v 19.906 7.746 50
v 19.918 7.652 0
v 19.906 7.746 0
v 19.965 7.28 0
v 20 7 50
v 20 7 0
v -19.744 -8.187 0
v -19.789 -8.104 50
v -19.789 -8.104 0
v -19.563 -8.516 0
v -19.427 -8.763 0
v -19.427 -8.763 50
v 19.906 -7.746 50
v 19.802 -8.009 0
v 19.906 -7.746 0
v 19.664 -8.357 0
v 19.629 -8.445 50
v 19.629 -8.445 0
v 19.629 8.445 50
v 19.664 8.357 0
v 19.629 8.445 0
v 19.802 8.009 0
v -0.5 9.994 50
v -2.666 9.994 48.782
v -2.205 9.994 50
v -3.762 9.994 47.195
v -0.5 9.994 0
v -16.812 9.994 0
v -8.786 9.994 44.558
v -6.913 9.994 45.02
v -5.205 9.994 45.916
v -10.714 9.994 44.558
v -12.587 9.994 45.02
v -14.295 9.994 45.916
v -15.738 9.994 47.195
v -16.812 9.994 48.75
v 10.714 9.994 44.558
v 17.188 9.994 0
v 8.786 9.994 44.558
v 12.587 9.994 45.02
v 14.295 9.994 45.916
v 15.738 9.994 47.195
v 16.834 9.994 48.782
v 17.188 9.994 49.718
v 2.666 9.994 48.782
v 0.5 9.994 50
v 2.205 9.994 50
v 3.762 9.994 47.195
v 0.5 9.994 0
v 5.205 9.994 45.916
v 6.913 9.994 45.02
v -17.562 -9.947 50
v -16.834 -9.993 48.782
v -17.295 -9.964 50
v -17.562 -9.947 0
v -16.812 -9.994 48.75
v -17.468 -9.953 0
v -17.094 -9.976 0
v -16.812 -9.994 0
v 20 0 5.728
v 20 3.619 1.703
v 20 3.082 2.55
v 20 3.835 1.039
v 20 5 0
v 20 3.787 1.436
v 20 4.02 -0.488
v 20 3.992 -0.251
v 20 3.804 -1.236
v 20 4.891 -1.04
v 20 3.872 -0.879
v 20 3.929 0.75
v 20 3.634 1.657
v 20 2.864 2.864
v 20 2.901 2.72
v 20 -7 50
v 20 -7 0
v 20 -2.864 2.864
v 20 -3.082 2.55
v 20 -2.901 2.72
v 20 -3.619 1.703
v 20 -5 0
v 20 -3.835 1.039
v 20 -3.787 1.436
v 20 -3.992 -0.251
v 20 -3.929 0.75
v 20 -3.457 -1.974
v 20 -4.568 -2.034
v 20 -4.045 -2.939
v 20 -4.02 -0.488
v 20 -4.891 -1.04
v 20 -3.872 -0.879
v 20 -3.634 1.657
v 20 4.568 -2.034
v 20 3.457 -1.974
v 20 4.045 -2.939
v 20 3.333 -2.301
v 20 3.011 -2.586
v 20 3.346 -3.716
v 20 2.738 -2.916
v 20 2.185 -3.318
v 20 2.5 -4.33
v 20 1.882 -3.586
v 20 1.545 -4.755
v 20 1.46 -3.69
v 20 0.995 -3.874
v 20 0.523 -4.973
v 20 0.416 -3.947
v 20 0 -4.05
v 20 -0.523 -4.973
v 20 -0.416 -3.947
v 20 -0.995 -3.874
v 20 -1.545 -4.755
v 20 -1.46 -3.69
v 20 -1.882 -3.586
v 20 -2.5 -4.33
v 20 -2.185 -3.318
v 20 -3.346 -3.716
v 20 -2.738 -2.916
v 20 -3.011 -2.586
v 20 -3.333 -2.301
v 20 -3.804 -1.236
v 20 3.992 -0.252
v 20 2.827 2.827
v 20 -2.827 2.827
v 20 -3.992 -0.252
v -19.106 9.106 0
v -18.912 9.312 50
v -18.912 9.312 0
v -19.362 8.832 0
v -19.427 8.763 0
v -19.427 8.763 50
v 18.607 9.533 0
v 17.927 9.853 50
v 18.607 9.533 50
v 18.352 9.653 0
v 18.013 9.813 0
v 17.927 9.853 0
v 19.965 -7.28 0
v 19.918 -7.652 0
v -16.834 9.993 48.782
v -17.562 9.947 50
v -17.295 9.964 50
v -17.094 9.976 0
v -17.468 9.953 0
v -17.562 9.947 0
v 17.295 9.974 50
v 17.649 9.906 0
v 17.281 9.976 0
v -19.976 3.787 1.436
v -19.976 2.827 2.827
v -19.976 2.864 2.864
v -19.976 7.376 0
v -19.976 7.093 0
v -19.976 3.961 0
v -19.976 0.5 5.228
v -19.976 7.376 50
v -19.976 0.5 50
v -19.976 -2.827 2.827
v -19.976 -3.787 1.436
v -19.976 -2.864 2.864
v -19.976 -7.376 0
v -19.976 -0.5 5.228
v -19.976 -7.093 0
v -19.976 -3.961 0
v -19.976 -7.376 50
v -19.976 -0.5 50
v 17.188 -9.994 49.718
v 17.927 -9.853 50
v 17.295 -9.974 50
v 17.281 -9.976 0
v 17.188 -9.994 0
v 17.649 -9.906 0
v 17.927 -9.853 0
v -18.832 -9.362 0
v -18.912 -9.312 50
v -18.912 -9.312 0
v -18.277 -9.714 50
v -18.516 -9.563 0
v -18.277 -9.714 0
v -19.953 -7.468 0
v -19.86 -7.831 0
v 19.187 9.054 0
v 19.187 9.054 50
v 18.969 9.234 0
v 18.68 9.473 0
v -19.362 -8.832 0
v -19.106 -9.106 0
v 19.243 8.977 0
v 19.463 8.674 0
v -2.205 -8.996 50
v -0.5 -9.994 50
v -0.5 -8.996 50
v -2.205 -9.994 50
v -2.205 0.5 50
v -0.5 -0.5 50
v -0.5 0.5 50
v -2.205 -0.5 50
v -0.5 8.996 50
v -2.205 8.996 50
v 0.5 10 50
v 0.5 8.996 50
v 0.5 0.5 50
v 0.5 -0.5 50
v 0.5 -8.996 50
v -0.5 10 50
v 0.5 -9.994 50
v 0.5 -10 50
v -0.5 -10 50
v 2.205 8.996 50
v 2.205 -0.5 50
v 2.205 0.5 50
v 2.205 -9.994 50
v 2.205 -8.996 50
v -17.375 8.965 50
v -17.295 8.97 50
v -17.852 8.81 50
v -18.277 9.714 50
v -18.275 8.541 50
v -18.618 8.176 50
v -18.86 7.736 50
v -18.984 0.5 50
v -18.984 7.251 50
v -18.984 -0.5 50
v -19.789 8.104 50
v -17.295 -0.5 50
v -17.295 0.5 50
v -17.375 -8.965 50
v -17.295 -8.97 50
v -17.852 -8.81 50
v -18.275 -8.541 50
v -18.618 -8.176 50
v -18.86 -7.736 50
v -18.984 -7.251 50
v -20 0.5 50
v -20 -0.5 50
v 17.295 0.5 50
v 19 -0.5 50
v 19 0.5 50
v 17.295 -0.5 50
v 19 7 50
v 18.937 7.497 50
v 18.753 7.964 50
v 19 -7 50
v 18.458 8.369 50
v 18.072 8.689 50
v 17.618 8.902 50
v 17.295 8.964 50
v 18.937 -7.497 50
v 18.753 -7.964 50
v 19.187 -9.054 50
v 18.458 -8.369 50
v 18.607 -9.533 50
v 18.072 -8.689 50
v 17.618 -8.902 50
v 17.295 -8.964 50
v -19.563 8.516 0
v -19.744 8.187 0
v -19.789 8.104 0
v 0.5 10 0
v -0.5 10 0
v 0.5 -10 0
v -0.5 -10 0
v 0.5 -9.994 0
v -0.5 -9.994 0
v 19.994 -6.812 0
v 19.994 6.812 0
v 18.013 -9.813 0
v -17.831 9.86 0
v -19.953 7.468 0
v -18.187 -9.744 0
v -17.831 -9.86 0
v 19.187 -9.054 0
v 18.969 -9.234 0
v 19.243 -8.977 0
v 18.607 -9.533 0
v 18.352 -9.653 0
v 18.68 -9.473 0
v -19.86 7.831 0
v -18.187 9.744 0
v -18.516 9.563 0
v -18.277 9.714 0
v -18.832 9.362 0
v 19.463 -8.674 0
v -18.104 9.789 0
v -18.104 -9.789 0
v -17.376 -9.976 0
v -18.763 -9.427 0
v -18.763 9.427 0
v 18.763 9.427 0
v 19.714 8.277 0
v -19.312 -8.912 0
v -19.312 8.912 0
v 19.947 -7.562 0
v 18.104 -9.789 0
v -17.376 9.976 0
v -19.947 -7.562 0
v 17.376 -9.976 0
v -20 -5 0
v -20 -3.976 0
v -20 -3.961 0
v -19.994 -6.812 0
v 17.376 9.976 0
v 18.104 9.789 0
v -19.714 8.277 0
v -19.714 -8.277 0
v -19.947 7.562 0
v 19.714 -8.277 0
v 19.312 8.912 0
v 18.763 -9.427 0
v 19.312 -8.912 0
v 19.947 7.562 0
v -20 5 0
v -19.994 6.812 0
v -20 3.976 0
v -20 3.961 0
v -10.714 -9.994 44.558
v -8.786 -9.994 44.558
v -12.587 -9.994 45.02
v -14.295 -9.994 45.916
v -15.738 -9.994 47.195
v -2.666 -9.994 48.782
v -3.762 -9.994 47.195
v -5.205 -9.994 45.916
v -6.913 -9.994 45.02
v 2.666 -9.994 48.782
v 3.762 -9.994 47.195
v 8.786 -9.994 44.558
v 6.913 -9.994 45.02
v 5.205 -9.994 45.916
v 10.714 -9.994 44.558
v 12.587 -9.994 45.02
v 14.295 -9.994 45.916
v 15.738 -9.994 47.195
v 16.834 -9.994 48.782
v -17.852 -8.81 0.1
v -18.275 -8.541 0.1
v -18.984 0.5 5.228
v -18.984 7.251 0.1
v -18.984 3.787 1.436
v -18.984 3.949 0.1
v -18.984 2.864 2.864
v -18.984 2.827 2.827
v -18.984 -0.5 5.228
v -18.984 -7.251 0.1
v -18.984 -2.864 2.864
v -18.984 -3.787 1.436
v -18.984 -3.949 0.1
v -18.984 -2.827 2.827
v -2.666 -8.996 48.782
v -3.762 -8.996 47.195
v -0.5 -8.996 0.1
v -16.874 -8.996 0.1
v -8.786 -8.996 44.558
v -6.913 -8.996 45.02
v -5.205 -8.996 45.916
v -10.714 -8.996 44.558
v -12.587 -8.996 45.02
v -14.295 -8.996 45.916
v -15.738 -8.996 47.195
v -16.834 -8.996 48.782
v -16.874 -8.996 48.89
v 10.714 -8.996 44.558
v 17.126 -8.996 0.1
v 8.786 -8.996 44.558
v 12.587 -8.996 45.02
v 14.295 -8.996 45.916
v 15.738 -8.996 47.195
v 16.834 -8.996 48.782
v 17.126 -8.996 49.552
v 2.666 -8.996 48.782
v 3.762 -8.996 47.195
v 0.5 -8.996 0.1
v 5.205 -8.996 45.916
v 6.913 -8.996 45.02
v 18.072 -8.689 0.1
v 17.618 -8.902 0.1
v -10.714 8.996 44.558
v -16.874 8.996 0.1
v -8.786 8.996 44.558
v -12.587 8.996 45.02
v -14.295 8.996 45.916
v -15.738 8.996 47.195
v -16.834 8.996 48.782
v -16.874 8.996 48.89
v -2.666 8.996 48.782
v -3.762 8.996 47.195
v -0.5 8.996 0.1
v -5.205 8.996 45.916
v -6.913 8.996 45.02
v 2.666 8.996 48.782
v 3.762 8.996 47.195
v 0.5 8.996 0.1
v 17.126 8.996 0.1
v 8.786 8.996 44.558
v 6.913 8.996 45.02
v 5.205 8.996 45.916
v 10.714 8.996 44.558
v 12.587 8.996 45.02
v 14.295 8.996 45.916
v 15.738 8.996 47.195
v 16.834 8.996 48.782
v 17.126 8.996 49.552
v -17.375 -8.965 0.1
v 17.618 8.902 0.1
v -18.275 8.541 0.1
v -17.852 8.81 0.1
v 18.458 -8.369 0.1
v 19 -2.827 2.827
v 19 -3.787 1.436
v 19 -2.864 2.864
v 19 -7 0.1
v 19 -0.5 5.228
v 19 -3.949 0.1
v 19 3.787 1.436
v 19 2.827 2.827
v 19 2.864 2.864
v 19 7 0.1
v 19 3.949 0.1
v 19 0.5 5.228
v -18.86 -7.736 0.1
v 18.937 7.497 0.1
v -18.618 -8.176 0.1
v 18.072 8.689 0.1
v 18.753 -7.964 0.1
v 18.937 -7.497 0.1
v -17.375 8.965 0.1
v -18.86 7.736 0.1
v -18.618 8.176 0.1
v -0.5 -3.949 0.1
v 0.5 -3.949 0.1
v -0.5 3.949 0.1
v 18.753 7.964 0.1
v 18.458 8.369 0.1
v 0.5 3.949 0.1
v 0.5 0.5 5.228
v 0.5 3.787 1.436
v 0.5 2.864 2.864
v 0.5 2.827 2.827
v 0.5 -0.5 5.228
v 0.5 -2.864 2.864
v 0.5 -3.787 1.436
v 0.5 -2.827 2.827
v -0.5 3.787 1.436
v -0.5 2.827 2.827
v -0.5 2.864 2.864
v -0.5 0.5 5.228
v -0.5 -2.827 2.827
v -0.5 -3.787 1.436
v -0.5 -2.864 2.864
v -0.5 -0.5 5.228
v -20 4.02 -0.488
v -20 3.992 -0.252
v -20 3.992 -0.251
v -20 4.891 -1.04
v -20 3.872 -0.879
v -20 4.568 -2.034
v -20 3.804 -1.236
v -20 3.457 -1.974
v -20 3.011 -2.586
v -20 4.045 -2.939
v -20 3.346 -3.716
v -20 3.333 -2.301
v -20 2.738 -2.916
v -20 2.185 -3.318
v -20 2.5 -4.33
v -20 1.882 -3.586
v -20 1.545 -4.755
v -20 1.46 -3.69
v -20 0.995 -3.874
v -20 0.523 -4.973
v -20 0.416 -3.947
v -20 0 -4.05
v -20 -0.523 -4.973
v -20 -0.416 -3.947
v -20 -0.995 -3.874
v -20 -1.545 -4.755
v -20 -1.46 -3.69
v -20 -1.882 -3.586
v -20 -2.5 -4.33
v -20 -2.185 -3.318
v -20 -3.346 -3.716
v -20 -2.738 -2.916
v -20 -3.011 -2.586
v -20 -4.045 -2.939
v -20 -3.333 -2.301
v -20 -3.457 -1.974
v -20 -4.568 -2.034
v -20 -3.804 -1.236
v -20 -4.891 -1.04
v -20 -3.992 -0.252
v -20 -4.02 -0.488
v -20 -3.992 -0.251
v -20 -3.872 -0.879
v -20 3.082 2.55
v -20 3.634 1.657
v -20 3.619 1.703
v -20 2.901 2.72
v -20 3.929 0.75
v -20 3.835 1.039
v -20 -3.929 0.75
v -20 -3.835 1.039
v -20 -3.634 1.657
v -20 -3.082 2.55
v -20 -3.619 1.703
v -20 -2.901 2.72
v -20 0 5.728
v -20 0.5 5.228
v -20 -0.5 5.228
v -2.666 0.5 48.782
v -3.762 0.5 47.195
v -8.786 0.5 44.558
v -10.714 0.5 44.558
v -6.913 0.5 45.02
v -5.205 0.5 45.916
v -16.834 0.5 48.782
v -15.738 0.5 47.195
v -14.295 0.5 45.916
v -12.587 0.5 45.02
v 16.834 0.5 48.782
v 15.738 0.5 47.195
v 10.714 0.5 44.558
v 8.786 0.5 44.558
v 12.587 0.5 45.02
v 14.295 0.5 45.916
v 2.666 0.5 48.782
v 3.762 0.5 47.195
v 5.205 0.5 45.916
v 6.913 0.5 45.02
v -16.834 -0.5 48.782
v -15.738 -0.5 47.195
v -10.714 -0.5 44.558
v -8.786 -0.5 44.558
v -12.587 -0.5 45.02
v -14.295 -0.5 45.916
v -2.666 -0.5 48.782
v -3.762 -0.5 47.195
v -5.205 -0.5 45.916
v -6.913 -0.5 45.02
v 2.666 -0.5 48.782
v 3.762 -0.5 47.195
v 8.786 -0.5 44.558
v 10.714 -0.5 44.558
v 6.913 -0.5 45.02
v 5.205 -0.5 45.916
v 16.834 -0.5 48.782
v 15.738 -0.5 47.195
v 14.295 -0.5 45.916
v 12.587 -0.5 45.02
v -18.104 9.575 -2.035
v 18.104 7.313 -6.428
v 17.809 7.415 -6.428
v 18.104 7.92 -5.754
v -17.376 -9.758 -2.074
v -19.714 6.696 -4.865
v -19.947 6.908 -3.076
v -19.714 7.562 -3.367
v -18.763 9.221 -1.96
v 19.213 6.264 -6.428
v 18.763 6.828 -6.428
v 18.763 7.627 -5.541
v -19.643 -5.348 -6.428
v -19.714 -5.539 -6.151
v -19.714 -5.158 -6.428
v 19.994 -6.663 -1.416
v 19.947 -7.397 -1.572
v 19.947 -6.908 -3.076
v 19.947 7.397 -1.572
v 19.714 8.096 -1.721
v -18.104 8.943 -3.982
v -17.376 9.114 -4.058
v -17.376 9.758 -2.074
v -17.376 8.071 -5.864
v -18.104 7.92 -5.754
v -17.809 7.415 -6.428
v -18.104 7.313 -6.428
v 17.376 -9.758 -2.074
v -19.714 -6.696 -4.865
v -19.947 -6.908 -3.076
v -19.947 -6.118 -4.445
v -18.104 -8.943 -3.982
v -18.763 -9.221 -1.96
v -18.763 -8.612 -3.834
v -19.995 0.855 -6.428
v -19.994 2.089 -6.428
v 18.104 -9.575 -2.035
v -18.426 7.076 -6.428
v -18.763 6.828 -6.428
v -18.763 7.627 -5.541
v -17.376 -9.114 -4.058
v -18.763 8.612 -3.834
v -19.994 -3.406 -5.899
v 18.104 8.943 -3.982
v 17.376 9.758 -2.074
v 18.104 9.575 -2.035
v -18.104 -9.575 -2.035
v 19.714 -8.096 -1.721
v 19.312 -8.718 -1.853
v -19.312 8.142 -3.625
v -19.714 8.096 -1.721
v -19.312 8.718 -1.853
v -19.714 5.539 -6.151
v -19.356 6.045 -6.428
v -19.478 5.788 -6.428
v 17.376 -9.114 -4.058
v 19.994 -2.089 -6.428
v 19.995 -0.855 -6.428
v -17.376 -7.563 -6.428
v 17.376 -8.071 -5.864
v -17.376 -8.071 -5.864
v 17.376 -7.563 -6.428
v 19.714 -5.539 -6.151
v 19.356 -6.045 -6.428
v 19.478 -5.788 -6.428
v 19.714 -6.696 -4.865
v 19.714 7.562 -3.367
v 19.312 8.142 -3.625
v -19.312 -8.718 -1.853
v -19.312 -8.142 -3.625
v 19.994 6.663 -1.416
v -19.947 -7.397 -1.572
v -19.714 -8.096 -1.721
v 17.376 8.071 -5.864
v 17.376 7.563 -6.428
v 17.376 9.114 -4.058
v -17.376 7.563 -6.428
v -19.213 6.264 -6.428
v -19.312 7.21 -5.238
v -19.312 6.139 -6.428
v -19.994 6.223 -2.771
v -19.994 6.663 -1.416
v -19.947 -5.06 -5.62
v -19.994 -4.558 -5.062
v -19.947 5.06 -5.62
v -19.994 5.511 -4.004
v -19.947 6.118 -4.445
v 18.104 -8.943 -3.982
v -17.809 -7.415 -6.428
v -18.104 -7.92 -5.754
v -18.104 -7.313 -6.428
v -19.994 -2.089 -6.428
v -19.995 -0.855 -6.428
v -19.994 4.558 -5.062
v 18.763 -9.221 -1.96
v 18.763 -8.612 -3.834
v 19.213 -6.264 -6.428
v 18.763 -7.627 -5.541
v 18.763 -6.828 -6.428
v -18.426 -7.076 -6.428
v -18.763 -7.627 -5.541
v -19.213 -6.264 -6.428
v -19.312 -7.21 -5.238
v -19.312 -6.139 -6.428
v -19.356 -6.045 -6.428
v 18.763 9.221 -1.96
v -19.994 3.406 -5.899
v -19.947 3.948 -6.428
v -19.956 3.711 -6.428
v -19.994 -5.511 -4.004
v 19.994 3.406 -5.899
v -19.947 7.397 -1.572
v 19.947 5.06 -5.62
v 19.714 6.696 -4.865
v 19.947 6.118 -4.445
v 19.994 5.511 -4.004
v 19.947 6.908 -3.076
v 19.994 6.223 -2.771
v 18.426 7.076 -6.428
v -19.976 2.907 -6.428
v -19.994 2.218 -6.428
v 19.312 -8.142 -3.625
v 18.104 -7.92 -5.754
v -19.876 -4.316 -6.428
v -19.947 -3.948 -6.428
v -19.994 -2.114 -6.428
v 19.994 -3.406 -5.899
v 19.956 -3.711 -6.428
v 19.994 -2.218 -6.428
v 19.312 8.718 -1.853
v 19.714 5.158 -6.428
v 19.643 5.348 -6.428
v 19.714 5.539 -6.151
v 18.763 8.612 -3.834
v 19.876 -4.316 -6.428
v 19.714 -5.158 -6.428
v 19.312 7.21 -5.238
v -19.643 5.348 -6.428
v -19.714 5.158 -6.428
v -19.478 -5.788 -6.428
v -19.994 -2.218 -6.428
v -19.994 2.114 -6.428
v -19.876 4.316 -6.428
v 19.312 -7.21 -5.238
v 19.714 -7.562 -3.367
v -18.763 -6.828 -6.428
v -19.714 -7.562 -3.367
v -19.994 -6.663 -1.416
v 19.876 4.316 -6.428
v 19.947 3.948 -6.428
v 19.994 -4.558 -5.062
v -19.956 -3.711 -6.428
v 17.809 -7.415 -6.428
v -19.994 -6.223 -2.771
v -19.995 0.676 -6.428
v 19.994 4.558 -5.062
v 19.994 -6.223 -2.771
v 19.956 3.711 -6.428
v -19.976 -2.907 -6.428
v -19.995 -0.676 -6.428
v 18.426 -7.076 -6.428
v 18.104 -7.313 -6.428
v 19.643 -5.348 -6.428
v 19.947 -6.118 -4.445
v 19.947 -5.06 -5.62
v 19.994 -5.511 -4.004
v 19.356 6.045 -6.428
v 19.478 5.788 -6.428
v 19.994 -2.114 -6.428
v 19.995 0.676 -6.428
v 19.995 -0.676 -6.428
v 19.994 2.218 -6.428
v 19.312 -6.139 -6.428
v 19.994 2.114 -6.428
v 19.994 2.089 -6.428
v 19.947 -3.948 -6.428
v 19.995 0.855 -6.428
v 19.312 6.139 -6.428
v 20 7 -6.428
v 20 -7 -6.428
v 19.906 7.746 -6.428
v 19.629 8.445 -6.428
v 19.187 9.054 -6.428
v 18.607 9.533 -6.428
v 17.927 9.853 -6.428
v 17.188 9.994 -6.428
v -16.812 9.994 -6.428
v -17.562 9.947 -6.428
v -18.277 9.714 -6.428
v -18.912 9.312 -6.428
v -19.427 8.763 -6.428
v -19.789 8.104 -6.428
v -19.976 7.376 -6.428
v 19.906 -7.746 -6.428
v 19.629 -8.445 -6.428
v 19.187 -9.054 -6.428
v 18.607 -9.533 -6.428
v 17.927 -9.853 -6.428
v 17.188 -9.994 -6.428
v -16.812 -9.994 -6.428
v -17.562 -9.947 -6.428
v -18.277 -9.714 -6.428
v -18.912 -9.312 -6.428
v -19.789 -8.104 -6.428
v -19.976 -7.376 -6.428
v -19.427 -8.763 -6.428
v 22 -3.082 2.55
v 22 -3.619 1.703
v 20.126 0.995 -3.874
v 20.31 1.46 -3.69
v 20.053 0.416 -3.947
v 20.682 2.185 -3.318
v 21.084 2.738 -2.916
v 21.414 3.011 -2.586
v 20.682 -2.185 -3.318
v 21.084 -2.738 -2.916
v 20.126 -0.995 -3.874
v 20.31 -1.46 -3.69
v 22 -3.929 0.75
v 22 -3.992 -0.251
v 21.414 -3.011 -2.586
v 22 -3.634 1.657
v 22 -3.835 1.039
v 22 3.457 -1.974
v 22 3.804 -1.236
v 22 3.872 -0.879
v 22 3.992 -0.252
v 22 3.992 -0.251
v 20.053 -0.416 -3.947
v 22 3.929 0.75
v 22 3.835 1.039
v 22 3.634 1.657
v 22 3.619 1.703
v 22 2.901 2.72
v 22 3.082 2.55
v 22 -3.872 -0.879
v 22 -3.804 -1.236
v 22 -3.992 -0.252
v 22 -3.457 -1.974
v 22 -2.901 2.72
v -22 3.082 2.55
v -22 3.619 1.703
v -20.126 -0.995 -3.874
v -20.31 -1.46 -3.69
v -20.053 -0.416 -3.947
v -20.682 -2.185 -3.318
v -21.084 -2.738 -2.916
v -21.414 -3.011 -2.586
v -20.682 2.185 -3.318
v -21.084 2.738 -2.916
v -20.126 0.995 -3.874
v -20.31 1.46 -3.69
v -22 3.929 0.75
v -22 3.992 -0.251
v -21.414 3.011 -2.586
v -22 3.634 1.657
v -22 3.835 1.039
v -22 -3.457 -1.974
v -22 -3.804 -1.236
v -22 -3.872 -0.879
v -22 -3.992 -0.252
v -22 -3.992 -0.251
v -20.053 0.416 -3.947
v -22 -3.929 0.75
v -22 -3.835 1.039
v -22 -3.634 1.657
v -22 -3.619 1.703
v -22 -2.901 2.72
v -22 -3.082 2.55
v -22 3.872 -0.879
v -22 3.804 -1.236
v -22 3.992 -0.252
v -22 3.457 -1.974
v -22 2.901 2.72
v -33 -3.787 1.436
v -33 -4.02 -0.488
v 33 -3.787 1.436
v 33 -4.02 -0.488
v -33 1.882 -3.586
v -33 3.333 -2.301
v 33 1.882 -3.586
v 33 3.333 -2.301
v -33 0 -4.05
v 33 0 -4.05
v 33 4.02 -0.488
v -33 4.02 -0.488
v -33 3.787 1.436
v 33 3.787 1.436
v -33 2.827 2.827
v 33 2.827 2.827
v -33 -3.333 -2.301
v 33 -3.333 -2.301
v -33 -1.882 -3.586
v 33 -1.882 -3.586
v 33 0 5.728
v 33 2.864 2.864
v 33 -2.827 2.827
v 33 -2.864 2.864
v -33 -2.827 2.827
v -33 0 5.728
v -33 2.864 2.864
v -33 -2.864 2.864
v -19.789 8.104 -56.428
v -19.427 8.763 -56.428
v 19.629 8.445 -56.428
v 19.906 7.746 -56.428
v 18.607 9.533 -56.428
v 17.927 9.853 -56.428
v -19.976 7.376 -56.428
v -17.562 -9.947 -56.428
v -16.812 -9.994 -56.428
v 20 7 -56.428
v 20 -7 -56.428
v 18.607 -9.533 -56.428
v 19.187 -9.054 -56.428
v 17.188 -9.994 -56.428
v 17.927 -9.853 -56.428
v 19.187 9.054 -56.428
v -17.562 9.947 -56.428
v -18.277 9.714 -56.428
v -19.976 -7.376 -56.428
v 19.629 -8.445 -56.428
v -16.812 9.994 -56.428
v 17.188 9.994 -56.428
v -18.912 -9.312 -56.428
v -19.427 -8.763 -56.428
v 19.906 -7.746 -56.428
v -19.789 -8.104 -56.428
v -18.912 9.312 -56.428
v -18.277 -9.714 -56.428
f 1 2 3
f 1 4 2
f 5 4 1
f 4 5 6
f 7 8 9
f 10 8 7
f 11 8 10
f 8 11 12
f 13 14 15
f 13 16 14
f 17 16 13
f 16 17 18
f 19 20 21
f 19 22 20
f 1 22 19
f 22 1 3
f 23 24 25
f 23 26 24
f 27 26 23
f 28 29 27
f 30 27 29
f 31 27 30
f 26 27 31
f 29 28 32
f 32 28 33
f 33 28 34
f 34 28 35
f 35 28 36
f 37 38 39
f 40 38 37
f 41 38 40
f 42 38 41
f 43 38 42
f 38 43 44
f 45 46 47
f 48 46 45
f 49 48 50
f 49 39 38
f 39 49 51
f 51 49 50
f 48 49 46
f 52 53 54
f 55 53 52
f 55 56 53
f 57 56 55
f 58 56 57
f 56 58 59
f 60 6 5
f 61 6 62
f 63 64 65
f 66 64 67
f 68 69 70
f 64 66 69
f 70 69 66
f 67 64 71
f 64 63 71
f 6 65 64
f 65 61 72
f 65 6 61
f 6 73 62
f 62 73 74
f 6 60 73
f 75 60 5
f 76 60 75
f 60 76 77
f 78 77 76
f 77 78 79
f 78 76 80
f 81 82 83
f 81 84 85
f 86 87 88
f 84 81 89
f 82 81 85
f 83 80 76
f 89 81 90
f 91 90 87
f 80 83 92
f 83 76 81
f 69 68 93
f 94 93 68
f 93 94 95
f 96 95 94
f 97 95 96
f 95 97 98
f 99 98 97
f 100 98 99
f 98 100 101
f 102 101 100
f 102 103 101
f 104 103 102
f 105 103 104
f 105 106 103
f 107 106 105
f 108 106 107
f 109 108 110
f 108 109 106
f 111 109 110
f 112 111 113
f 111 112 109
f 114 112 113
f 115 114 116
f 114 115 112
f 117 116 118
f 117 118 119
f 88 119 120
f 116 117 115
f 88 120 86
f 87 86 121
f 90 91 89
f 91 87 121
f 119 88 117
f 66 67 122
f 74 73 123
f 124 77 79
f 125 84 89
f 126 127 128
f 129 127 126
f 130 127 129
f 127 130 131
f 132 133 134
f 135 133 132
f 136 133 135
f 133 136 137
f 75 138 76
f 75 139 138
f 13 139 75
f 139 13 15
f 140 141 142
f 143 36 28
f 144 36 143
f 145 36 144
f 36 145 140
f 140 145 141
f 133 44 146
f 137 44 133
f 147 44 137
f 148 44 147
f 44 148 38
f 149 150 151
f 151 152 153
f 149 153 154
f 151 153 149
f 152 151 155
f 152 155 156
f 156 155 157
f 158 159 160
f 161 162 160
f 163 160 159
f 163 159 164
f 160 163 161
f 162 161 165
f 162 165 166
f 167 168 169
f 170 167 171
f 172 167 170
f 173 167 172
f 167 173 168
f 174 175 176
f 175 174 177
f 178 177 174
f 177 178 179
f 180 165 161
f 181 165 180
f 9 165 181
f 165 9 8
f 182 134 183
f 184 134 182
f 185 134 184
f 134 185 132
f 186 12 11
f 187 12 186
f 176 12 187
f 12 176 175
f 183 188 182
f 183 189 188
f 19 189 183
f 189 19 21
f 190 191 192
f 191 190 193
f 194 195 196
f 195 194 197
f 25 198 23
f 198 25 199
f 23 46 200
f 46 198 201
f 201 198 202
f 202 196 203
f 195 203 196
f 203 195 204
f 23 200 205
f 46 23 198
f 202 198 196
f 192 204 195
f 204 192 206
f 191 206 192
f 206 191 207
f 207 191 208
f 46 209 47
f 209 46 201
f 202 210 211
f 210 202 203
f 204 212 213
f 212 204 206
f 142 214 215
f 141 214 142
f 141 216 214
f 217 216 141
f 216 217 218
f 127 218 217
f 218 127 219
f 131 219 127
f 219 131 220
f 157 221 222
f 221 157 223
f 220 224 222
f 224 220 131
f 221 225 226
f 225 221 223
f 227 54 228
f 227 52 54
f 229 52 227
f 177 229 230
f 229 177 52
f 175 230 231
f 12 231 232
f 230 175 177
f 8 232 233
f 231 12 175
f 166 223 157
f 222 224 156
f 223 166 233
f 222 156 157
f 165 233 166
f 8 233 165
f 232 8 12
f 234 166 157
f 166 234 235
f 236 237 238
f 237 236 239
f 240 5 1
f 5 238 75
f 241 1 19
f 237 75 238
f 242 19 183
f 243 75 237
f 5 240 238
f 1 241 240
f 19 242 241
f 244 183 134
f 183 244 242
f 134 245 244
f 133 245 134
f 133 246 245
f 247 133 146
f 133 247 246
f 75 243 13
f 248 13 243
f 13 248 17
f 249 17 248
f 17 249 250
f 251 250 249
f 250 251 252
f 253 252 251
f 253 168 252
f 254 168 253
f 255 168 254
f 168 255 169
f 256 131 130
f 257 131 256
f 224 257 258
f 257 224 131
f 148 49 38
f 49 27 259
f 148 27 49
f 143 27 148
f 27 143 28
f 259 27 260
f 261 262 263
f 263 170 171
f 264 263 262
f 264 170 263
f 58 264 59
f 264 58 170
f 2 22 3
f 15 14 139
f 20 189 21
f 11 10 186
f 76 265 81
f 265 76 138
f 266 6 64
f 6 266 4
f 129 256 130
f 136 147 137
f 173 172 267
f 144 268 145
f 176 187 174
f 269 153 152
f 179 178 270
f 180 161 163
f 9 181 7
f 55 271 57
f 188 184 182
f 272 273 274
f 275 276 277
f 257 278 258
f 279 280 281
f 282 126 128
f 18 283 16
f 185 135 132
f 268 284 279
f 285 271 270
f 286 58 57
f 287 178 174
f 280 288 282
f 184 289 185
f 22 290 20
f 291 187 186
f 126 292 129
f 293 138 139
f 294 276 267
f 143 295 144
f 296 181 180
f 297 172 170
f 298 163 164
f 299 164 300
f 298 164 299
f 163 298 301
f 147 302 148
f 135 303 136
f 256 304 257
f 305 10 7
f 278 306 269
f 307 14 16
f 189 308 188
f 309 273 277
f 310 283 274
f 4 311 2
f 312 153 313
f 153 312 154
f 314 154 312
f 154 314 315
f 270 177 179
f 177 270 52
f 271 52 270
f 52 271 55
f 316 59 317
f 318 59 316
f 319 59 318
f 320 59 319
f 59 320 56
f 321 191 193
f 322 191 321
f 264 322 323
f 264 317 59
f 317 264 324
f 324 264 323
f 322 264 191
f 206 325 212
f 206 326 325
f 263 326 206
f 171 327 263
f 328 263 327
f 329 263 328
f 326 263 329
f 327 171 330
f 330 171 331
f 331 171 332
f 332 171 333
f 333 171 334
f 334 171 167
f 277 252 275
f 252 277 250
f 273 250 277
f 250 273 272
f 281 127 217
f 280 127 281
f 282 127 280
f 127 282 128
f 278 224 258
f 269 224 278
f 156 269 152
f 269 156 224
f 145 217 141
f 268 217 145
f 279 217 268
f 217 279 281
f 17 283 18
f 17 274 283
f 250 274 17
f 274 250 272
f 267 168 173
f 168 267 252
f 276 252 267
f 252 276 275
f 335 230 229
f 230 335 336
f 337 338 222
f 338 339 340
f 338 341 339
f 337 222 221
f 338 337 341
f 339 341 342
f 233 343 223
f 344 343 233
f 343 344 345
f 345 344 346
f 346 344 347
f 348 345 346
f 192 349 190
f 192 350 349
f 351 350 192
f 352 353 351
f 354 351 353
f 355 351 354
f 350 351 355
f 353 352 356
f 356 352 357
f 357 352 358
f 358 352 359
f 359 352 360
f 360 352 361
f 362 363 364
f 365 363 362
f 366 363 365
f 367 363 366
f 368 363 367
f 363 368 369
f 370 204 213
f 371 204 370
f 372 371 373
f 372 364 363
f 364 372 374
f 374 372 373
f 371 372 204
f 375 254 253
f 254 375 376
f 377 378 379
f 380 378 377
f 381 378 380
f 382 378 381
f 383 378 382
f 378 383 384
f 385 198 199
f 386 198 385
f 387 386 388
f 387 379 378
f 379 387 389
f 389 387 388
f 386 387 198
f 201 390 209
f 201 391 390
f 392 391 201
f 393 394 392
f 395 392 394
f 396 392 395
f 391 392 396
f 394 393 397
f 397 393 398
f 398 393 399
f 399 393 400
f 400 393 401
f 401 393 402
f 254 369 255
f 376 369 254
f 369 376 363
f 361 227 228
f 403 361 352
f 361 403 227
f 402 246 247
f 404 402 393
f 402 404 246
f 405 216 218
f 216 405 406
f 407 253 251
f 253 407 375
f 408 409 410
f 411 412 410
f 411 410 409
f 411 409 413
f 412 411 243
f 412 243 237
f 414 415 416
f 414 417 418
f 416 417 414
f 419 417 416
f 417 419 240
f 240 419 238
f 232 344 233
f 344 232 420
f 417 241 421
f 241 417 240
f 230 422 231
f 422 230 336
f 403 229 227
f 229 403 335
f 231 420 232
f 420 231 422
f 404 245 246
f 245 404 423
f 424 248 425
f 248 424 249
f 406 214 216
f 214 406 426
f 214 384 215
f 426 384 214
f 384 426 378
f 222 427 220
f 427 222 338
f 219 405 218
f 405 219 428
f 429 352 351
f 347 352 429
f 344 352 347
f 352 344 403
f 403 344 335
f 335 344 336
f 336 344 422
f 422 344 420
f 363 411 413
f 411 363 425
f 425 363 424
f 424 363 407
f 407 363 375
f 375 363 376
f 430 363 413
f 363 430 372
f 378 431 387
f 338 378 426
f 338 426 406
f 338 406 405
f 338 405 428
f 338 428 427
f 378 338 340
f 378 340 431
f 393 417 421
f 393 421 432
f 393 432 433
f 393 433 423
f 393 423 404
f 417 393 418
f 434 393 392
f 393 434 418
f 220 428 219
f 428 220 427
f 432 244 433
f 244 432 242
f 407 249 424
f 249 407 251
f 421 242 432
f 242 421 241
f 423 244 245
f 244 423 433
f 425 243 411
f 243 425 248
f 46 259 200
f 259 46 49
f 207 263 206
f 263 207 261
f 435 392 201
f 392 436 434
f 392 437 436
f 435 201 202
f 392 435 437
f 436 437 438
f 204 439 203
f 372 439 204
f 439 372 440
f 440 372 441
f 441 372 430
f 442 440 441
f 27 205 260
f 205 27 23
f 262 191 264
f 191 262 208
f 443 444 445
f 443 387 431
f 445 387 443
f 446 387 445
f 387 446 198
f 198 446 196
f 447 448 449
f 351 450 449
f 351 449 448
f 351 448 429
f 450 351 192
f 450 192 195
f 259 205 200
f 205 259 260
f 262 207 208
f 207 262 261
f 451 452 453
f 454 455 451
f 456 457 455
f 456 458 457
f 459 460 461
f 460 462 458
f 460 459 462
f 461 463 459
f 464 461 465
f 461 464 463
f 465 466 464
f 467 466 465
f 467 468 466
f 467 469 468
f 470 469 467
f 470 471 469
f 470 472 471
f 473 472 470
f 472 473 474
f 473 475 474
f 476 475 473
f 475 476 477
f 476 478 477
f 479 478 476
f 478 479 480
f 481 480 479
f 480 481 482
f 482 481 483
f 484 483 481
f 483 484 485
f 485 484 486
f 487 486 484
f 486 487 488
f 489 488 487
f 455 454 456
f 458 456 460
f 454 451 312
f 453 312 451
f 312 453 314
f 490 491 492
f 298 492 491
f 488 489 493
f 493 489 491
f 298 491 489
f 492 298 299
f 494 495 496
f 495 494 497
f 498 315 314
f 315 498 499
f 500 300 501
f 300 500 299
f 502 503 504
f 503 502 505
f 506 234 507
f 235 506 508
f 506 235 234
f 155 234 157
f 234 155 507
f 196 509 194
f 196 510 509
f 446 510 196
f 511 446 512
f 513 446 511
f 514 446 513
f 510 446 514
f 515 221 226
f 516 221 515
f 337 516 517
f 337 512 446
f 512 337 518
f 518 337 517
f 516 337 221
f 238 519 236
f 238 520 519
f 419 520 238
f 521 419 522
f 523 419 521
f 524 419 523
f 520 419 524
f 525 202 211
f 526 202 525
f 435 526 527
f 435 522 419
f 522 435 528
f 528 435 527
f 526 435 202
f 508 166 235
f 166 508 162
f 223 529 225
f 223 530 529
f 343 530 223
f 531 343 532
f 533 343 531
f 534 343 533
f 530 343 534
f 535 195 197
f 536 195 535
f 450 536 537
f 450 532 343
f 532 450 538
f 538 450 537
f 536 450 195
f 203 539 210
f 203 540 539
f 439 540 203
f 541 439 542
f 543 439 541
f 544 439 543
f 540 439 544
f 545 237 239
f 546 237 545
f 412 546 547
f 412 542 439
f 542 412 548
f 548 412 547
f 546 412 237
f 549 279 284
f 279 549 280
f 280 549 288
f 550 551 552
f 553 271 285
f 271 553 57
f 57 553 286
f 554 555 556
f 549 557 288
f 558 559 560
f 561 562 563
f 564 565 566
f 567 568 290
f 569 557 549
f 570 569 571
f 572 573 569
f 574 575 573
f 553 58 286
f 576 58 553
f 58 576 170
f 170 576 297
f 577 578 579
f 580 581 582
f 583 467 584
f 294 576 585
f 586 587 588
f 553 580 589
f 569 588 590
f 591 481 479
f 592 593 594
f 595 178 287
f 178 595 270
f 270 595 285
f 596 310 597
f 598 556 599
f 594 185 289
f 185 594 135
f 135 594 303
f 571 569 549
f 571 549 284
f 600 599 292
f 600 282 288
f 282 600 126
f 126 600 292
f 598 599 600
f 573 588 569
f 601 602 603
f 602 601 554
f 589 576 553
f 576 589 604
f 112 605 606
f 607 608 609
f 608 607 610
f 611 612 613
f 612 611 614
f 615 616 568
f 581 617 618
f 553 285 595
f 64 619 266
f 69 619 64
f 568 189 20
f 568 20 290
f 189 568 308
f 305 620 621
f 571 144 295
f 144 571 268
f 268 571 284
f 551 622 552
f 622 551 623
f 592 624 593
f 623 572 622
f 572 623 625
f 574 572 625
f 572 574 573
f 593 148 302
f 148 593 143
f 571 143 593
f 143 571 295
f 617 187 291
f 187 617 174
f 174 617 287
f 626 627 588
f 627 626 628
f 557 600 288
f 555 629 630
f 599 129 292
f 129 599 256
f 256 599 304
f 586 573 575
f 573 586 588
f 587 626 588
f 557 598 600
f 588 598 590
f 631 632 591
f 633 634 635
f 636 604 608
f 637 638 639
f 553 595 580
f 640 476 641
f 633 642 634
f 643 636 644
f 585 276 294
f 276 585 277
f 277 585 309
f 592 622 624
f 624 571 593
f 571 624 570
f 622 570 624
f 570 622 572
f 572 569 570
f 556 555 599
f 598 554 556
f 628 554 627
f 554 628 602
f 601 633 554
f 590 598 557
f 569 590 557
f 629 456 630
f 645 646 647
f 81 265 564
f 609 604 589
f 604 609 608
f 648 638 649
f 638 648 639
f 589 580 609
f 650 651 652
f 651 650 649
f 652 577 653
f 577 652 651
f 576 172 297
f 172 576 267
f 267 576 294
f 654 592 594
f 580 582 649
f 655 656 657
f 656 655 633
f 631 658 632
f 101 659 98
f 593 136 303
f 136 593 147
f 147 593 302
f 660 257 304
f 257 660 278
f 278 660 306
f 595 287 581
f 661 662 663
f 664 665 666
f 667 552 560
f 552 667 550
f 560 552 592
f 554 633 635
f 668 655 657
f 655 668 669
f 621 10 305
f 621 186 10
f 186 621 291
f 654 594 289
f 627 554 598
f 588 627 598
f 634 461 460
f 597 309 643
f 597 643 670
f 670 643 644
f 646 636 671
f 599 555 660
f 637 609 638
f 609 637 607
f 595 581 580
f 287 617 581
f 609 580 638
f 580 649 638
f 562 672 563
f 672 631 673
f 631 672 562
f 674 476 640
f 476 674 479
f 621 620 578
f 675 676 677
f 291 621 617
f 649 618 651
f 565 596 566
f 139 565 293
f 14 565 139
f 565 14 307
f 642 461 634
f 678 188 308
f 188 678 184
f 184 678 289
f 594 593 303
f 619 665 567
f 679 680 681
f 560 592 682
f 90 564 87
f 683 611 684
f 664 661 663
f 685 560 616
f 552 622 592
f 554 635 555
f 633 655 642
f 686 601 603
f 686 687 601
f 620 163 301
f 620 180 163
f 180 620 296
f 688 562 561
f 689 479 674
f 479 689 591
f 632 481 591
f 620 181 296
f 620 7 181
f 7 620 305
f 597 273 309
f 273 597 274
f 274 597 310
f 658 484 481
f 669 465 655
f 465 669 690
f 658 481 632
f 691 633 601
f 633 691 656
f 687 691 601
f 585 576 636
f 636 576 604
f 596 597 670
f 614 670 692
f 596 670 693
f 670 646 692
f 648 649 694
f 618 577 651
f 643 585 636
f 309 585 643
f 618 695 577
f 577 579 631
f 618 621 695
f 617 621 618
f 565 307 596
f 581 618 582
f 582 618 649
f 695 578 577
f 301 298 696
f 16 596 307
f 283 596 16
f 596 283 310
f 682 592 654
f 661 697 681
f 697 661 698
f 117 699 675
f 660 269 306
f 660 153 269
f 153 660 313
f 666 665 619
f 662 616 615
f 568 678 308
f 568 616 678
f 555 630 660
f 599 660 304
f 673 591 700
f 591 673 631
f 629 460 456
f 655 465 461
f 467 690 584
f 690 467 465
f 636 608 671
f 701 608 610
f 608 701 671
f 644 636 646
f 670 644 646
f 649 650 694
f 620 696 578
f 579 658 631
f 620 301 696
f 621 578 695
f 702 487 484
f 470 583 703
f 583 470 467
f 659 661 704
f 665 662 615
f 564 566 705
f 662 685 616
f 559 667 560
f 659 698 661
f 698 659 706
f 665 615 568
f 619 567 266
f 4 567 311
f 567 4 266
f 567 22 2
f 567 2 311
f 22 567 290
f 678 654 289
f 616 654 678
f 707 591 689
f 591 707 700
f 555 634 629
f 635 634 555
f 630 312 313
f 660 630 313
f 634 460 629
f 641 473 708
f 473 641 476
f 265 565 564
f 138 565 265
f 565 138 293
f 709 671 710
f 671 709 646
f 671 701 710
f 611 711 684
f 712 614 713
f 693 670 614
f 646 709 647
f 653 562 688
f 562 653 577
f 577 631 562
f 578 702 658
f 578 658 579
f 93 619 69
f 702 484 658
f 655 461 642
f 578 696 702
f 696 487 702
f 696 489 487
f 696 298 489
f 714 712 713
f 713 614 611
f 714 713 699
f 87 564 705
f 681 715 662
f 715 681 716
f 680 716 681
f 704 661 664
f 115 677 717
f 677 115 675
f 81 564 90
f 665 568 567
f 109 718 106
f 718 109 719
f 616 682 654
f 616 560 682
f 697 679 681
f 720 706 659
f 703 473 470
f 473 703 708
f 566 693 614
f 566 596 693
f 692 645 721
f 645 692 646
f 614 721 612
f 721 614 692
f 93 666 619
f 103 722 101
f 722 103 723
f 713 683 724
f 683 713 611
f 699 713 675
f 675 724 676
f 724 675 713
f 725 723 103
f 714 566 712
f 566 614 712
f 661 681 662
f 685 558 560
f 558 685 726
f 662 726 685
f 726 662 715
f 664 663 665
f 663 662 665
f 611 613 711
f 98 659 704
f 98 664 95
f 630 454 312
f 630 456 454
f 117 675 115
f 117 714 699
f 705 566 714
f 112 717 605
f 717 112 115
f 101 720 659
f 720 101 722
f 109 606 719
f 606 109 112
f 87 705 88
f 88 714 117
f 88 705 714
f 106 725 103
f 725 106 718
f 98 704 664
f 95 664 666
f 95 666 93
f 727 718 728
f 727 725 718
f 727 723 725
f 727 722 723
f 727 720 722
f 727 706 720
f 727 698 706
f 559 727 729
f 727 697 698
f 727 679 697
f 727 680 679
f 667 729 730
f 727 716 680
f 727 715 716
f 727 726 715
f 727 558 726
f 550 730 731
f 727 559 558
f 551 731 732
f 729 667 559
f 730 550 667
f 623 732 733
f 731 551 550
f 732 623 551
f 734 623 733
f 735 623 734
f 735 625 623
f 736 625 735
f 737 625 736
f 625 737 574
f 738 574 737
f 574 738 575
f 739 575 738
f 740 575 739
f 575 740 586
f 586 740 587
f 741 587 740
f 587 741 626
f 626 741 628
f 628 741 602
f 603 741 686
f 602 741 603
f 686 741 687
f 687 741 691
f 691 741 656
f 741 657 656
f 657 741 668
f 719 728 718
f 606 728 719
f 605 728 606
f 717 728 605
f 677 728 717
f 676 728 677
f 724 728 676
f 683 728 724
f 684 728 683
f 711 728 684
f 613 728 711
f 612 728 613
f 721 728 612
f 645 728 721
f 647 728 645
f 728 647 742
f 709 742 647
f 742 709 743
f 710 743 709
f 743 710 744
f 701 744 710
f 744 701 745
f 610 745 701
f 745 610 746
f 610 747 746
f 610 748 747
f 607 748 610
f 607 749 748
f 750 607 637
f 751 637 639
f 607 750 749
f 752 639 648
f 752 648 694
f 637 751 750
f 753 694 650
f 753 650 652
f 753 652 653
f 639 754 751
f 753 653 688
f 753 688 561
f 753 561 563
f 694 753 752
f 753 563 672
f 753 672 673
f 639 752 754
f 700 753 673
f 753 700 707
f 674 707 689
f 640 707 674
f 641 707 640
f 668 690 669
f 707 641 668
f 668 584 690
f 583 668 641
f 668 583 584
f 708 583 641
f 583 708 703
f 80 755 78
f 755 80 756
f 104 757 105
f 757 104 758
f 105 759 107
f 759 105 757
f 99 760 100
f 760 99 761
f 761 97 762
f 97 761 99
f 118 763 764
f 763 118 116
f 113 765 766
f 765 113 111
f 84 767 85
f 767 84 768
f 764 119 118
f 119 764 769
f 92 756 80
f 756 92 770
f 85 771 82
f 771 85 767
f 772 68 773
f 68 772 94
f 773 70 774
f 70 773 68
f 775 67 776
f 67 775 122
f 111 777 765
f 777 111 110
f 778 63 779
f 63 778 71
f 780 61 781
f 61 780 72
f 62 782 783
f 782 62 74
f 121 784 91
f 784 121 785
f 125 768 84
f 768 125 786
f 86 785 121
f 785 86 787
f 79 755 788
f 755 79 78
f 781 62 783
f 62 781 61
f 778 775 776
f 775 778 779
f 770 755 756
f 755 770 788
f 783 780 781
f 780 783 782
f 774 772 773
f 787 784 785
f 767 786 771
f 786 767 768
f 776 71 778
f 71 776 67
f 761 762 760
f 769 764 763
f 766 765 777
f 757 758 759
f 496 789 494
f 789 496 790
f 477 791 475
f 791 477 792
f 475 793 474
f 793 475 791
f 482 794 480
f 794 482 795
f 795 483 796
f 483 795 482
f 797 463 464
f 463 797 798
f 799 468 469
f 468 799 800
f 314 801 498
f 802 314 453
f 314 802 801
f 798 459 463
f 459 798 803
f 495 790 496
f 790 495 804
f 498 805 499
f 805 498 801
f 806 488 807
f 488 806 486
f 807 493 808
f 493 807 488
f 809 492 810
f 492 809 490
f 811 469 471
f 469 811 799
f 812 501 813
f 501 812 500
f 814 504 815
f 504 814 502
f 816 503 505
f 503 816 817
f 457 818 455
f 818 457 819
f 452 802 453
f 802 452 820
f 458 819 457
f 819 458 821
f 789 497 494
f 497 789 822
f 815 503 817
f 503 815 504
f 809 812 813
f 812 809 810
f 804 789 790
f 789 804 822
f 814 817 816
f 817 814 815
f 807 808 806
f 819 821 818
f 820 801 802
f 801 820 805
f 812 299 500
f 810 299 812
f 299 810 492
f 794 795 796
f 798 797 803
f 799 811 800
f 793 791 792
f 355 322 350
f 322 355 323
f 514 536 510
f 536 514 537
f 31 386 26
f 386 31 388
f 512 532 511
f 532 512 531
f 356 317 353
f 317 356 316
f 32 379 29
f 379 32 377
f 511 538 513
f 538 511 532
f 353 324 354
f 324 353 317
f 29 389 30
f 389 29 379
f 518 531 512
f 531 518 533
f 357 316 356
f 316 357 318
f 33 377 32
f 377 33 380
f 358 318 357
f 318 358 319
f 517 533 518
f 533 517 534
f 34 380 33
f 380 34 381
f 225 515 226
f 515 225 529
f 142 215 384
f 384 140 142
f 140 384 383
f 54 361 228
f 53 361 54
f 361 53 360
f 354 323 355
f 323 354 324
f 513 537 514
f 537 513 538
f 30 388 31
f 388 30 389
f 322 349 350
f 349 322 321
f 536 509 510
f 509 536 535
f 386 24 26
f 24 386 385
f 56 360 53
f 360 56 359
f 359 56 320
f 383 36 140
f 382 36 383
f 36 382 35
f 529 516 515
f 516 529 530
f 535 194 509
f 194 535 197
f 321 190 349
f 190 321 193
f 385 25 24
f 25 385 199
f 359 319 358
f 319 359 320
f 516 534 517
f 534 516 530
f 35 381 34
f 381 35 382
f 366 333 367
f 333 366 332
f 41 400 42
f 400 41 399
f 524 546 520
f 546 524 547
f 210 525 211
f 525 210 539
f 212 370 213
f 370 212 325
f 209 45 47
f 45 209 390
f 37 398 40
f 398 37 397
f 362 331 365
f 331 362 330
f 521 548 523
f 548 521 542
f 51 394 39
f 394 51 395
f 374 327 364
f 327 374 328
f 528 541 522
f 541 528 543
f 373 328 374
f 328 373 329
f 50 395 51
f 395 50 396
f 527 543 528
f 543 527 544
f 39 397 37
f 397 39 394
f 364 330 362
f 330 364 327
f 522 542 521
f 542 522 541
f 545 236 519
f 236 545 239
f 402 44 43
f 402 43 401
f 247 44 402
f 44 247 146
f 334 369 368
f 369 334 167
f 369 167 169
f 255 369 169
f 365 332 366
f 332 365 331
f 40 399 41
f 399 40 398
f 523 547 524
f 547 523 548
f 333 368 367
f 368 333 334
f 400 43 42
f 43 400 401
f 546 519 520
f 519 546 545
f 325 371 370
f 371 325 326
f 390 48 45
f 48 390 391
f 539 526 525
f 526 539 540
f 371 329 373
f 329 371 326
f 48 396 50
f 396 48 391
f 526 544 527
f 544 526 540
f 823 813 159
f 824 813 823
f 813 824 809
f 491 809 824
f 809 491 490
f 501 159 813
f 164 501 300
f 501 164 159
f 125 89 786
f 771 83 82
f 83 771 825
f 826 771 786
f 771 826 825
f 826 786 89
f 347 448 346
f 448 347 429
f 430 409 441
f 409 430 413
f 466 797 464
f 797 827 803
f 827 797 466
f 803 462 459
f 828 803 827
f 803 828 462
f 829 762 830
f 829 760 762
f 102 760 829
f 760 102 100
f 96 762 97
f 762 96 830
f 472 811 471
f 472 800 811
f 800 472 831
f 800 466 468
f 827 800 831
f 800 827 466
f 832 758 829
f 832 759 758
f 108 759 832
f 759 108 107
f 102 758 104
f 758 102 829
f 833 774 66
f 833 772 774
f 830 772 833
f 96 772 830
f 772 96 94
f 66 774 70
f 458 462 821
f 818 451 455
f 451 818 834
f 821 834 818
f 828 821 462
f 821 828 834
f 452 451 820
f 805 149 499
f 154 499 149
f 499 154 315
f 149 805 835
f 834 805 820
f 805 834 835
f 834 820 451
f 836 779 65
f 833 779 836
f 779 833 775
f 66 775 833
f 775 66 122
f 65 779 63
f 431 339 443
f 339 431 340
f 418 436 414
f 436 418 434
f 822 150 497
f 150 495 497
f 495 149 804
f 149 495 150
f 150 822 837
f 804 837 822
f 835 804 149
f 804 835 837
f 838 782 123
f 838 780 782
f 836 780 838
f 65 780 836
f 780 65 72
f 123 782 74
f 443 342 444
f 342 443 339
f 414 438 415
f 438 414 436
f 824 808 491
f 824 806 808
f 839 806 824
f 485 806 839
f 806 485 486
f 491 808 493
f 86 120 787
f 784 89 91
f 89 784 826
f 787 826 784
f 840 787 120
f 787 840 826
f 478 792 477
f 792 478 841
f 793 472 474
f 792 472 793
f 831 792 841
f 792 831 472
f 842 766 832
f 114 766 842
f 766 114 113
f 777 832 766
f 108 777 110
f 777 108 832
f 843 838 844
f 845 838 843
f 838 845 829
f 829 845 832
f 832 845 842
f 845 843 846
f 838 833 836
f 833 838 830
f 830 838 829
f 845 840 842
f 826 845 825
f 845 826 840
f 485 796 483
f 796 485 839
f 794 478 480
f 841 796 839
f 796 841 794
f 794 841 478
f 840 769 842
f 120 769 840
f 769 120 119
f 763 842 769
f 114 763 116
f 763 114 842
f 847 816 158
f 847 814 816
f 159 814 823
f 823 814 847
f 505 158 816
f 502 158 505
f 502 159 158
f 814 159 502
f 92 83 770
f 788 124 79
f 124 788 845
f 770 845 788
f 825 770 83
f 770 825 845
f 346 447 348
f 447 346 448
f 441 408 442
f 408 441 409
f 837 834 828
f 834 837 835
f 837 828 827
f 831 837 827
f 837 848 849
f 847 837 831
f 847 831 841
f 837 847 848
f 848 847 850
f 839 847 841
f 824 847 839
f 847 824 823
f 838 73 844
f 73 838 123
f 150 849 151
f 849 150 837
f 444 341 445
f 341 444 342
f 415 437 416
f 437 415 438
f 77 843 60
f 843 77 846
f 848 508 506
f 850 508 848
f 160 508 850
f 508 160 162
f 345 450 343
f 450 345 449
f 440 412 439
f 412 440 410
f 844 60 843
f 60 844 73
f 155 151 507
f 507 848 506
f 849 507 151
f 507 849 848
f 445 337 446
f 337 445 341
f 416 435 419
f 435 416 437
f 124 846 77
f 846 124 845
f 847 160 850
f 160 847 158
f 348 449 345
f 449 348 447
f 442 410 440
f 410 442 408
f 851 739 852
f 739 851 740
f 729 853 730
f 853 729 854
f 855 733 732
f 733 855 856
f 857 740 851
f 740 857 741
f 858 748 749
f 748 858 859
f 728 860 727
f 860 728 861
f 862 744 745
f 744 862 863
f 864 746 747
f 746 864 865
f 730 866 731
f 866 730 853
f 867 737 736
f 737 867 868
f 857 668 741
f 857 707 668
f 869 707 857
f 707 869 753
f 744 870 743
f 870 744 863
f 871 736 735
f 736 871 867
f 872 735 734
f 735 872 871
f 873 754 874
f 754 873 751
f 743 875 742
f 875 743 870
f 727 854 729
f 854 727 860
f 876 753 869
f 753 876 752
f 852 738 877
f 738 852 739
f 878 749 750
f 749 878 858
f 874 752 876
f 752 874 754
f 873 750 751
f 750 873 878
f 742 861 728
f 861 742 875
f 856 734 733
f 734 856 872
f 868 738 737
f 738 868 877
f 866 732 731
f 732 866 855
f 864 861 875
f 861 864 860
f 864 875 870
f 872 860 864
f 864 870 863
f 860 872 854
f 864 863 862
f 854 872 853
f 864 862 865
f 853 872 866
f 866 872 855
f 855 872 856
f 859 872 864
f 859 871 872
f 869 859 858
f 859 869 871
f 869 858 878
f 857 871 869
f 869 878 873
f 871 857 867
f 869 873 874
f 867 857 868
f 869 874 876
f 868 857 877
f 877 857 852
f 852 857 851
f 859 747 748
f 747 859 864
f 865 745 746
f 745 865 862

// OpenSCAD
// file: Divided_box.scad
//divided_box(100, 50, 30, 4, 2, 8, 3, 2, 25,0,[1]);
smooth_rect(10,20,30,4);
//Divided box module
//x, y, and z are the size of the box.
//base_ht is the thickness of the base.
//wall_t is the thickness of the walls.
//crad is the radius of the corners. If it's <= 0, the box will have sharp corners.
//If either the base height or the wall thickness are <= 0, the box will be solid.
//x_div and y_div are the numbers of divisions in the box in the x and y directions.
//div_height is the height of the dividers; if <=0, this is set to the height of the box.
//x_skips and y_skips are arrays that list the numbered dividers to skip.

module divided_box(x, y, z,
                    base_ht = 0,
                    wall_t = 0,
                    crad = 0,
                    x_div = 0,
                    y_div = 0,
                    div_height = 0,
                    x_skips = [], y_skips = [])
{
    translate([-x/2, -y/2, 0])
    {
        int_crad = crad - wall_t;
        //Set or clear the divider heights
        divider_height = div_height <=0? z:div_height;
        //Set or clear whether or not the box is solid
        solidbox = ((base_ht <= 0)||(wall_t <= 0))? true:false;
        echo ("Solidbox: ");
        echo (solidbox);
    //    bht = box_base_height;
        difference() {
            //Outside of box:
            smooth_rect(x, y, z,crad);
            //If not a solid box, remove the inside area:
            if (!solidbox)
            {
                translate([crad-int_crad, crad-int_crad, base_ht]) smooth_rect(x - 2*wall_t, y - 2*wall_t, z, int_crad);
            }
        }
        //Add the X dividers
        if (x_div > 0) {
            for(i = [1:x_div])
            {
                skip = len(search(i, x_skips)) > 0? true : false;
                if (!skip)
                {
                    compartment = (x)/(x_div + 1);
                    translate([compartment * i - (wall_t/2),0,0]) cube([wall_t, y, divider_height]);
                }
            }
        }
        if (y_div > 0) {
            for(i = [1:y_div])
            {
                skip = len(search(i, y_skips)) > 0? true : false;
                if (!skip)
                {
                    compartment = (y)/(y_div + 1);
                    translate([0,compartment * i - (wall_t/2),0]) cube([x, wall_t, divider_height]);
                }
            }
        }
    }
}

module smooth_rect(x, y, z, rad)
{
    module corner()
        {
            cylinder(z,rad,rad,$fn=25);
        }
    if (rad > 0)
    {
        hull() {
            translate([rad,rad,0]) corner();
            translate([x-rad,rad,0]) corner();
            translate([rad,y-rad,0]) corner();
            translate([x-rad,y-rad,0]) corner();
        }
    }
    else
    {
        cube([x,y,z]);
    }
}
// main file
//Create a rotatable interior compartment
//flip_compartment(50,40,20, 10, 5);
use <Divided_box.scad>;

flip_compartment("add",
                40, 20, 50,
                pip_ht = 2,
                pip_d = 8,
                base_ht = 0.1,
                wall_t = 1,
                crad = 3,
                x_div = 1, y_div = 1,
                div_height = 0,
                x_skips = [], y_skips = [],
                tolerance = 0.1,
                grabhole = [-5.5, 0.8]);
                
#flip_compartment("remove",
                40, 20, 50,
                pip_ht = 2,
                pip_d = 8,
                base_ht = 0.1,
                wall_t = 1,
                crad = 3,
                x_div = 2, y_div = 1,
                div_height = 0,
                x_skips = [], y_skips = [],
                tolerance = 0.1);


module flip_compartment(operation,
                        x, y, z,
                        pip_ht,
                        pip_d,
                        base_ht = 0,
                        wall_t = 0,
                        crad = 0,
                        x_div = 0, y_div = 0,
                        div_height = 0,
                        x_skips = [], y_skips = [],
                        tolerance = 0.1,
                        grabhole = [0, 0.5])
{
    //The "operation" field lets the user specify if they want to add the box or add the area to cut out FOR the box.
    if (operation == "add")
    {
        difference()
        {
            rad_div_box(x, y, z,
                        pip_ht,
                        pip_d,
                        base_ht,
                        wall_t,
                        crad,
                        x_div, y_div,
                        div_height,
                        x_skips, y_skips);
            if (grabhole[1] > 0)
            {
                grab_d = grabhole[1]*x/(x_div+1);
                grab_z_offset = grabhole[0] + z + grab_d/2;
                grab_thick = 2*y;
                grab_ctrdist = z;
                slot_area_w = x-wall_t;
                slot_spacing = slot_area_w/(1+x_div);
                echo("Slot area: ", slot_area_w);
                echo("Slot spacing: ",slot_spacing);
                if (x_div != 0)
                {
                    for (i = [(-slot_area_w + slot_spacing)/2:slot_spacing:(slot_area_w - slot_spacing)/2])
                        translate([i,0,grab_z_offset])
                            {
                                echo(i);
                                grabslot(grab_d, grab_thick, grab_ctrdist);
                            }
                }
                else
                    translate([0,0,grab_z_offset])
                        grabslot(grab_d, grab_thick, grab_ctrdist);
                                
            }
        }
    }
    else    //Generate negative shape to remove
    {
        union()
        {
            ht = 1.5*((pip_ht * 2) + x); //Make sure it's super long to poke through the box.
            dia = (pip_d + tolerance);
            rotate([0, 90, 0])
                teardrop(dia, ht);                      //Nub hole
            translate([0, 0, -(y/2 * cos(50)+(z/2))])
                translate([-x/2, -y/2, -z/2])
                    smooth_rect(x, y, z, crad);         //Support hole for base
        }
    }
}

module grabslot(diameter, thickness, length)
{
    hull()
        {
            rotate([90, 0, 0])
                cylinder(h = thickness, d = diameter, center = true);
            translate([0, 0, length])
                rotate([90, 0, 0])
                    cylinder(h = thickness, d = diameter, center = true);
        }
}

module rad_div_box(x, y, z,
                   pip_ht,
                   pip_d,
                   base_ht = 0,
                   wall_t = 0,
                   crad = 0,
                   x_div = 0, y_div = 0,
                   div_height = 0,
                   x_skips = [], y_skips = [])
{
    union()
    {
        //Box portion:
        divided_box(x, y, z, base_ht, wall_t, crad, x_div, y_div, div_height, x_skips, y_skips);
        //Round portion:
        flat_half_cylinder(x,y/2,crad, 50);
        //Pips:
          rotpat(2)
          {
            translate([x/2,0,0])
                rotate([0,90,0])
                    chamf_cylinder(pip_d, pip_ht);
          }
    }
}

module chamf_cylinder(diameter, height)
{
    difference()
    {
        cylinder(h=height, d=diameter, $fn=25);
        translate([0.5 * diameter,0,height])
            rotate([0,45,0])
                cube([height*sqrt(2), diameter*2,height*sqrt(2)], true);
    }
}

module half_cylinder(length, radius, fillet)
{
    clen = min(length, radius)/2;       //Corner length
    rotate([-90, 0, 90])
        rotate_extrude(angle=180)
            rotate([0,0,180])
                hull()
                {
                    if (fillet > 0)
                    {
                        for (dy = [-(length-2*fillet)/2:length-2*fillet:(length-2*fillet)/2])
                        {
                            translate([-(radius-fillet), dy, 0])
                                circle(r=fillet, $fn=25);
                        }
                    }
                    else
                    {
                        translate([-fillet/2, dy, 0])
                            square(1, true);
                    }
                    for (dy = [-(length-clen)/2:length-clen:(length-clen)/2])
                    {
                        translate([-clen/2, dy, 0])
                            square(clen, true);
                    }
                }
}
module flat_half_cylinder(length, radius, fillet, tan_ang = 45)
{
    difference()
    {
        half_cylinder(length, radius, fillet);
        translate([0, 0, -(radius * cos(tan_ang)+(radius/2))])
            cube([length*2, radius*2, radius], true);
    }
}
module rotpat(instances, totalangle = -1)
{
    dt = totalangle == -1? (360/(instances)):totalangle/(instances-1);
    for (i = [0:(instances-1)])
    {
        rotate([0,0,i*dt])
            children(0);
    }
}

module teardrop (diameter, height)
{
    union()
    {
        cylinder(h = height, d = diameter, center = true);
        sqsize = diameter/2;
        translate([-diameter/(2*sqrt(2)),0,0])
            rotate([0, 0, 45])
                cube([sqsize, sqsize, height], center = true);
    }
}
